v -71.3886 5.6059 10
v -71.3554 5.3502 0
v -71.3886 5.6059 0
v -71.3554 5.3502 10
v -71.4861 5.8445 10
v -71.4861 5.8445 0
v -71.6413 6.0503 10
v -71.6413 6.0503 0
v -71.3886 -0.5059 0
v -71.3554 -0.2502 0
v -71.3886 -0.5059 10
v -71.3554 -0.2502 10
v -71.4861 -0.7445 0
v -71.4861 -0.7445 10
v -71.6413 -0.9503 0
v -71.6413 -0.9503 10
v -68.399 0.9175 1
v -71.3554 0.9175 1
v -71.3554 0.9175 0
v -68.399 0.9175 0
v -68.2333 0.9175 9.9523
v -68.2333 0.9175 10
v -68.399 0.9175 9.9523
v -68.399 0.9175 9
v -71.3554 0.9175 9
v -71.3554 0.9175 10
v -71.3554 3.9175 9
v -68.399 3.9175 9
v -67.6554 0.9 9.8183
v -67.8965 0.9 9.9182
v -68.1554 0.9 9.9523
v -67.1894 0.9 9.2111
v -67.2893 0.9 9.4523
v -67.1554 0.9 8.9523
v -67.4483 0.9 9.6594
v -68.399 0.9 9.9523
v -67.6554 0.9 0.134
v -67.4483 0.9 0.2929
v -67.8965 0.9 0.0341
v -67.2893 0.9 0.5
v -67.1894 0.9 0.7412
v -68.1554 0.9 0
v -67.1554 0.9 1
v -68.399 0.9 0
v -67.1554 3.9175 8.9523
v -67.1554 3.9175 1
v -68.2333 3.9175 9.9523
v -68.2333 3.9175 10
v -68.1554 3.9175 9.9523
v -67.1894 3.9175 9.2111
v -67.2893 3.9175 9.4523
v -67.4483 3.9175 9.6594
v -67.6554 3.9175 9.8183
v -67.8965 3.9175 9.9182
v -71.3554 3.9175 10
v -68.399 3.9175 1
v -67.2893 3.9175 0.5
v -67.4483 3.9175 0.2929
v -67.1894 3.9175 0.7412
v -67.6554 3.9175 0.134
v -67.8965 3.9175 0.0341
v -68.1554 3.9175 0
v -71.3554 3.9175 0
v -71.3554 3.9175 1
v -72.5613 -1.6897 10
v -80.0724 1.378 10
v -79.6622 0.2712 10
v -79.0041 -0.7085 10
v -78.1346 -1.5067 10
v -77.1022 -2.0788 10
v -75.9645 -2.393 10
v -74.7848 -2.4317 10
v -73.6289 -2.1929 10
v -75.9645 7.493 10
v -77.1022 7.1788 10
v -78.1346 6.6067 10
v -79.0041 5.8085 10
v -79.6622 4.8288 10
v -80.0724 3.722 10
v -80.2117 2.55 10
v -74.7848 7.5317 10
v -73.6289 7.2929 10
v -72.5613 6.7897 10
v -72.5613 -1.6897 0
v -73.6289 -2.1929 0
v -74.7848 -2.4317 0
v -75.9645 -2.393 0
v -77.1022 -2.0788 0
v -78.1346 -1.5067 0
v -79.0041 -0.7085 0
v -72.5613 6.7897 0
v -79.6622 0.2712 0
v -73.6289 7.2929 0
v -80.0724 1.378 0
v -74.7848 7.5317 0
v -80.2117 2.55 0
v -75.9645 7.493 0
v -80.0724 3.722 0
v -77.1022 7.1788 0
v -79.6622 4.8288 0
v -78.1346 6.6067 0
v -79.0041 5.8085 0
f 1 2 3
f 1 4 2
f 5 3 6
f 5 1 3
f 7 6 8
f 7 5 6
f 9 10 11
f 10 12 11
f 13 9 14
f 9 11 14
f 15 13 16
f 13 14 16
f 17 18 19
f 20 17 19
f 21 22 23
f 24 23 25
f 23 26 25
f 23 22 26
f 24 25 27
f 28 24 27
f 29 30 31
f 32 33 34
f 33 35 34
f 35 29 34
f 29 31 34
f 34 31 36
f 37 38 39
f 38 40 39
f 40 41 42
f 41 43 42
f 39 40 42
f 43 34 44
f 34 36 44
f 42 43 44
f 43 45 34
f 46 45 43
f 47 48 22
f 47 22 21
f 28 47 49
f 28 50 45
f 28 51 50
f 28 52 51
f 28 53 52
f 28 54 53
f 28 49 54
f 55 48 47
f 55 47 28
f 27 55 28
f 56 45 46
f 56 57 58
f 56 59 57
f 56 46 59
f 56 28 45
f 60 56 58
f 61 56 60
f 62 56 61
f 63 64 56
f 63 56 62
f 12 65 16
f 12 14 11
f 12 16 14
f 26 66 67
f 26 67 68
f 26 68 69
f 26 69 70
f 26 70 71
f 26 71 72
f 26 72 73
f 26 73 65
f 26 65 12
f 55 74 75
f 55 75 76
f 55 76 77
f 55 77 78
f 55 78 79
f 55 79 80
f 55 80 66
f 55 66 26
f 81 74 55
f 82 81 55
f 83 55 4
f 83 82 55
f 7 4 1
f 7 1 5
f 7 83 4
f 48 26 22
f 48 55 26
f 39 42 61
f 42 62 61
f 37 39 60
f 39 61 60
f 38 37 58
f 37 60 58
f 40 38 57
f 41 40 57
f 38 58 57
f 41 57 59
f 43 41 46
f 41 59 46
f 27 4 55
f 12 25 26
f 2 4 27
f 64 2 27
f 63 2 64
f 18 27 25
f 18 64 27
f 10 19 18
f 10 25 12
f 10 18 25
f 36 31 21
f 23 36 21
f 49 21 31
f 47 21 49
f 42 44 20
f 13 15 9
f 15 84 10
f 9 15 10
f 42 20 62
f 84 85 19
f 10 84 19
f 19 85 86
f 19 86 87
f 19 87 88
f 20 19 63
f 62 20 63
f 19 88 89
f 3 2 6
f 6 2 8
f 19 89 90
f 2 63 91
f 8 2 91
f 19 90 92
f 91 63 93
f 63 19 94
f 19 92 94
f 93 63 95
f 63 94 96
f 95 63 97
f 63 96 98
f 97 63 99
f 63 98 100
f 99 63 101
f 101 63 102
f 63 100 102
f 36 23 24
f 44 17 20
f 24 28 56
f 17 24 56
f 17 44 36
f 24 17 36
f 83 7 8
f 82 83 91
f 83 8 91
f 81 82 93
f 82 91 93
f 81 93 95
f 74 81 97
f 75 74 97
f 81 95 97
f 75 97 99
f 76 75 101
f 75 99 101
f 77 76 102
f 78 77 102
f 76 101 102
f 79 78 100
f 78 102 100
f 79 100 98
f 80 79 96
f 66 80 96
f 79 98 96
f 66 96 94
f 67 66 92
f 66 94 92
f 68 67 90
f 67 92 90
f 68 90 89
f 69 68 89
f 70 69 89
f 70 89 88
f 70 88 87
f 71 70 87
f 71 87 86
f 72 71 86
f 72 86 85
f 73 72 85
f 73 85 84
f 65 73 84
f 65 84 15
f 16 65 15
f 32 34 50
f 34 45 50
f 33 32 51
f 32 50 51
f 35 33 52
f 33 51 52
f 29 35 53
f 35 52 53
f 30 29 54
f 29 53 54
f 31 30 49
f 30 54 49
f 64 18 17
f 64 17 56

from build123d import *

# Parameters (mm, degrees)
SKETCH_1_R            = 5
EXTRUDE_1_DEPTH       = 10
SKETCH_9_W            = 7.120641766
SKETCH_9_H            = 4.534999238
EXTRUDE_6_DEPTH       = 1
SKETCH_11_W           = 1.257653538
SKETCH_11_H           = 9
EXTRUDE_7_DEPTH       = 4.5
EXTRUDE_8_DEPTH       = 6
FILLET_8_R            = 1
FILLET_9_R            = 1
CUT_EXTRUDE_1_DEPTH   = 10
SKETCH_14_W           = 1
SKETCH_14_H           = 3
EXTRUDE_9_DEPTH       = 3.122043073
SKETCH_15_W           = 1
SKETCH_15_H           = 3
EXTRUDE_10_DEPTH      = 4
EXTRUDE_11_DEPTH      = 0.2
EXTRUDE_11_DEPTH_BACK = 1.043632387
SKETCH_16_W           = 9.952294967
SKETCH_16_H           = 3.01746433
FILLET_11_R           = 1
FILLET_12_R           = 1
FILLET_13_R           = 1
FILLET_14_R           = 1


with BuildPart() as part:
    # 草圖1 → 填料-伸長1 (new body)
    with BuildSketch(Plane(origin=(0.382706605, 0, 0), x_dir=(1, 0, 0), z_dir=(0, 0, 1))):
        with Locations((-75.594417438, 2.55)):
            Circle(SKETCH_1_R)
    extrude(amount=EXTRUDE_1_DEPTH)

    # 草圖9 → 填料-伸長6 (add)
    with BuildSketch(Plane(origin=(6.127831546, 0, 9), x_dir=(1, 0, 0), z_dir=(0, 0, 1))):
        with Locations((-75.644850643, 2.267499619)):
            Rectangle(SKETCH_9_W, SKETCH_9_H)
    extrude(amount=EXTRUDE_6_DEPTH)



with BuildPart() as body_2:
    # 草圖11 → 填料-伸長7 (new body)
    with BuildSketch(Plane(origin=(9.574526933, 4.534999238, 0.48426017), x_dir=(1, 0, 0), z_dir=(0, 1, 0))):
        with Locations((-76.184774061, -4.5)):
            Rectangle(SKETCH_11_W, SKETCH_11_H)
    extrude(amount=-EXTRUDE_7_DEPTH)


with BuildPart() as part_1:
    add(part.part)

    add(body_2.part)  # 填料-伸長8 merges body 2
    # 草圖12 → 填料-伸長8 (add)
    with BuildSketch(Plane.ZY.offset(67.239073897)):
        Polygon((0.48426017, 4.534999238), (0.48426017, 0), (1.483647509, 0.034999238), (1.483647509, 4.534999238), align=None)
    extrude(amount=EXTRUDE_8_DEPTH)

    # 圓角8
    fillet_8_edges = [part_1.edges().sort_by_distance(p)[0] for p in [
        (-65.981420359, 2.284999238, 0.48426017),
    ]]
    fillet(fillet_8_edges, radius=FILLET_8_R)

    # 圓角9
    fillet_9_edges = [part_1.edges().sort_by_distance(p)[0] for p in [
        (-65.956698214, 2.267499619, 10),
    ]]
    fillet(fillet_9_edges, radius=FILLET_9_R - 0.0001)  # a hair under: the kernel refuses the full size

    # 草圖13 → 除料-伸長1 (cut)
    with BuildSketch(Plane(origin=(0, 0, 0), x_dir=(-1, 0, 0), z_dir=(0, 0, -1))):
        with BuildLine():
            Line((71.355365605, 5.732546384), (71.355365605, -0.632546384))
            ThreePointArc((71.355365605, -0.632546384), (70.211710833, 2.55), (71.355365605, 5.732546384))
        make_face()
    extrude(amount=-CUT_EXTRUDE_1_DEPTH, mode=Mode.SUBTRACT)


with BuildPart() as body_2_2:
    # of the pieces the cut leaves, the one that is kept (cut_extrude_1_keep)
    add(part_1.part.solids().sort_by_distance((-71.355365605, 5.732546384, 0))[0])

    # 草圖14 → 填料-伸長9 (add)
    with BuildSketch(Plane(origin=(-71.355365605, 0, 0), x_dir=(0, 0, -1), z_dir=(1, 0, 0))):
        with Locations((-9.5, 2.417510407)):
            Rectangle(SKETCH_14_W, SKETCH_14_H)
    extrude(amount=EXTRUDE_9_DEPTH)

    # 草圖15 → 填料-伸長10 (add)
    with BuildSketch(Plane(origin=(-71.355365605, 0, 0), x_dir=(0, 0, -1), z_dir=(1, 0, 0))):
        with Locations((-0.5, 2.417510407)):
            Rectangle(SKETCH_15_W, SKETCH_15_H)
    extrude(amount=EXTRUDE_10_DEPTH)

    # 草圖16 → 填料-伸長11 (add, two sides: drawn at the far end of the back side and taken through both)
    with BuildSketch(Plane(origin=(-67.355365605, 0, 0), x_dir=(0, 0, -1), z_dir=(1, 0, 0)).offset(-EXTRUDE_11_DEPTH_BACK)):
        with Locations((-4.976147484, 2.408778242)):
            Rectangle(SKETCH_16_W, SKETCH_16_H)
    extrude(amount=EXTRUDE_11_DEPTH + EXTRUDE_11_DEPTH_BACK)

    # 圓角11
    fillet_11_edges = [body_2_2.edges().sort_by_distance(p)[0] for p in [
        (-67.155365605, 2.408778242, 0),
    ]]
    fillet(fillet_11_edges, radius=FILLET_11_R)

    # 圓角12
    fillet_12_edges = [body_2_2.edges().sort_by_distance(p)[0] for p in [
        (-67.155365605, 2.408778242, 9.952294967),
    ]]
    fillet(fillet_12_edges, radius=FILLET_12_R)

    # 圓角13
    fillet_13_edges = [body_2_2.edges().sort_by_distance(p)[0] for p in [
        (-71.355365605, 5.732546384, 5),
    ]]
    fillet(fillet_13_edges, radius=FILLET_13_R)

    # 圓角14
    fillet_14_edges = [body_2_2.edges().sort_by_distance(p)[0] for p in [
        (-71.355365605, -0.632546384, 5),
    ]]
    fillet(fillet_14_edges, radius=FILLET_14_R)


solid = body_2_2.part
